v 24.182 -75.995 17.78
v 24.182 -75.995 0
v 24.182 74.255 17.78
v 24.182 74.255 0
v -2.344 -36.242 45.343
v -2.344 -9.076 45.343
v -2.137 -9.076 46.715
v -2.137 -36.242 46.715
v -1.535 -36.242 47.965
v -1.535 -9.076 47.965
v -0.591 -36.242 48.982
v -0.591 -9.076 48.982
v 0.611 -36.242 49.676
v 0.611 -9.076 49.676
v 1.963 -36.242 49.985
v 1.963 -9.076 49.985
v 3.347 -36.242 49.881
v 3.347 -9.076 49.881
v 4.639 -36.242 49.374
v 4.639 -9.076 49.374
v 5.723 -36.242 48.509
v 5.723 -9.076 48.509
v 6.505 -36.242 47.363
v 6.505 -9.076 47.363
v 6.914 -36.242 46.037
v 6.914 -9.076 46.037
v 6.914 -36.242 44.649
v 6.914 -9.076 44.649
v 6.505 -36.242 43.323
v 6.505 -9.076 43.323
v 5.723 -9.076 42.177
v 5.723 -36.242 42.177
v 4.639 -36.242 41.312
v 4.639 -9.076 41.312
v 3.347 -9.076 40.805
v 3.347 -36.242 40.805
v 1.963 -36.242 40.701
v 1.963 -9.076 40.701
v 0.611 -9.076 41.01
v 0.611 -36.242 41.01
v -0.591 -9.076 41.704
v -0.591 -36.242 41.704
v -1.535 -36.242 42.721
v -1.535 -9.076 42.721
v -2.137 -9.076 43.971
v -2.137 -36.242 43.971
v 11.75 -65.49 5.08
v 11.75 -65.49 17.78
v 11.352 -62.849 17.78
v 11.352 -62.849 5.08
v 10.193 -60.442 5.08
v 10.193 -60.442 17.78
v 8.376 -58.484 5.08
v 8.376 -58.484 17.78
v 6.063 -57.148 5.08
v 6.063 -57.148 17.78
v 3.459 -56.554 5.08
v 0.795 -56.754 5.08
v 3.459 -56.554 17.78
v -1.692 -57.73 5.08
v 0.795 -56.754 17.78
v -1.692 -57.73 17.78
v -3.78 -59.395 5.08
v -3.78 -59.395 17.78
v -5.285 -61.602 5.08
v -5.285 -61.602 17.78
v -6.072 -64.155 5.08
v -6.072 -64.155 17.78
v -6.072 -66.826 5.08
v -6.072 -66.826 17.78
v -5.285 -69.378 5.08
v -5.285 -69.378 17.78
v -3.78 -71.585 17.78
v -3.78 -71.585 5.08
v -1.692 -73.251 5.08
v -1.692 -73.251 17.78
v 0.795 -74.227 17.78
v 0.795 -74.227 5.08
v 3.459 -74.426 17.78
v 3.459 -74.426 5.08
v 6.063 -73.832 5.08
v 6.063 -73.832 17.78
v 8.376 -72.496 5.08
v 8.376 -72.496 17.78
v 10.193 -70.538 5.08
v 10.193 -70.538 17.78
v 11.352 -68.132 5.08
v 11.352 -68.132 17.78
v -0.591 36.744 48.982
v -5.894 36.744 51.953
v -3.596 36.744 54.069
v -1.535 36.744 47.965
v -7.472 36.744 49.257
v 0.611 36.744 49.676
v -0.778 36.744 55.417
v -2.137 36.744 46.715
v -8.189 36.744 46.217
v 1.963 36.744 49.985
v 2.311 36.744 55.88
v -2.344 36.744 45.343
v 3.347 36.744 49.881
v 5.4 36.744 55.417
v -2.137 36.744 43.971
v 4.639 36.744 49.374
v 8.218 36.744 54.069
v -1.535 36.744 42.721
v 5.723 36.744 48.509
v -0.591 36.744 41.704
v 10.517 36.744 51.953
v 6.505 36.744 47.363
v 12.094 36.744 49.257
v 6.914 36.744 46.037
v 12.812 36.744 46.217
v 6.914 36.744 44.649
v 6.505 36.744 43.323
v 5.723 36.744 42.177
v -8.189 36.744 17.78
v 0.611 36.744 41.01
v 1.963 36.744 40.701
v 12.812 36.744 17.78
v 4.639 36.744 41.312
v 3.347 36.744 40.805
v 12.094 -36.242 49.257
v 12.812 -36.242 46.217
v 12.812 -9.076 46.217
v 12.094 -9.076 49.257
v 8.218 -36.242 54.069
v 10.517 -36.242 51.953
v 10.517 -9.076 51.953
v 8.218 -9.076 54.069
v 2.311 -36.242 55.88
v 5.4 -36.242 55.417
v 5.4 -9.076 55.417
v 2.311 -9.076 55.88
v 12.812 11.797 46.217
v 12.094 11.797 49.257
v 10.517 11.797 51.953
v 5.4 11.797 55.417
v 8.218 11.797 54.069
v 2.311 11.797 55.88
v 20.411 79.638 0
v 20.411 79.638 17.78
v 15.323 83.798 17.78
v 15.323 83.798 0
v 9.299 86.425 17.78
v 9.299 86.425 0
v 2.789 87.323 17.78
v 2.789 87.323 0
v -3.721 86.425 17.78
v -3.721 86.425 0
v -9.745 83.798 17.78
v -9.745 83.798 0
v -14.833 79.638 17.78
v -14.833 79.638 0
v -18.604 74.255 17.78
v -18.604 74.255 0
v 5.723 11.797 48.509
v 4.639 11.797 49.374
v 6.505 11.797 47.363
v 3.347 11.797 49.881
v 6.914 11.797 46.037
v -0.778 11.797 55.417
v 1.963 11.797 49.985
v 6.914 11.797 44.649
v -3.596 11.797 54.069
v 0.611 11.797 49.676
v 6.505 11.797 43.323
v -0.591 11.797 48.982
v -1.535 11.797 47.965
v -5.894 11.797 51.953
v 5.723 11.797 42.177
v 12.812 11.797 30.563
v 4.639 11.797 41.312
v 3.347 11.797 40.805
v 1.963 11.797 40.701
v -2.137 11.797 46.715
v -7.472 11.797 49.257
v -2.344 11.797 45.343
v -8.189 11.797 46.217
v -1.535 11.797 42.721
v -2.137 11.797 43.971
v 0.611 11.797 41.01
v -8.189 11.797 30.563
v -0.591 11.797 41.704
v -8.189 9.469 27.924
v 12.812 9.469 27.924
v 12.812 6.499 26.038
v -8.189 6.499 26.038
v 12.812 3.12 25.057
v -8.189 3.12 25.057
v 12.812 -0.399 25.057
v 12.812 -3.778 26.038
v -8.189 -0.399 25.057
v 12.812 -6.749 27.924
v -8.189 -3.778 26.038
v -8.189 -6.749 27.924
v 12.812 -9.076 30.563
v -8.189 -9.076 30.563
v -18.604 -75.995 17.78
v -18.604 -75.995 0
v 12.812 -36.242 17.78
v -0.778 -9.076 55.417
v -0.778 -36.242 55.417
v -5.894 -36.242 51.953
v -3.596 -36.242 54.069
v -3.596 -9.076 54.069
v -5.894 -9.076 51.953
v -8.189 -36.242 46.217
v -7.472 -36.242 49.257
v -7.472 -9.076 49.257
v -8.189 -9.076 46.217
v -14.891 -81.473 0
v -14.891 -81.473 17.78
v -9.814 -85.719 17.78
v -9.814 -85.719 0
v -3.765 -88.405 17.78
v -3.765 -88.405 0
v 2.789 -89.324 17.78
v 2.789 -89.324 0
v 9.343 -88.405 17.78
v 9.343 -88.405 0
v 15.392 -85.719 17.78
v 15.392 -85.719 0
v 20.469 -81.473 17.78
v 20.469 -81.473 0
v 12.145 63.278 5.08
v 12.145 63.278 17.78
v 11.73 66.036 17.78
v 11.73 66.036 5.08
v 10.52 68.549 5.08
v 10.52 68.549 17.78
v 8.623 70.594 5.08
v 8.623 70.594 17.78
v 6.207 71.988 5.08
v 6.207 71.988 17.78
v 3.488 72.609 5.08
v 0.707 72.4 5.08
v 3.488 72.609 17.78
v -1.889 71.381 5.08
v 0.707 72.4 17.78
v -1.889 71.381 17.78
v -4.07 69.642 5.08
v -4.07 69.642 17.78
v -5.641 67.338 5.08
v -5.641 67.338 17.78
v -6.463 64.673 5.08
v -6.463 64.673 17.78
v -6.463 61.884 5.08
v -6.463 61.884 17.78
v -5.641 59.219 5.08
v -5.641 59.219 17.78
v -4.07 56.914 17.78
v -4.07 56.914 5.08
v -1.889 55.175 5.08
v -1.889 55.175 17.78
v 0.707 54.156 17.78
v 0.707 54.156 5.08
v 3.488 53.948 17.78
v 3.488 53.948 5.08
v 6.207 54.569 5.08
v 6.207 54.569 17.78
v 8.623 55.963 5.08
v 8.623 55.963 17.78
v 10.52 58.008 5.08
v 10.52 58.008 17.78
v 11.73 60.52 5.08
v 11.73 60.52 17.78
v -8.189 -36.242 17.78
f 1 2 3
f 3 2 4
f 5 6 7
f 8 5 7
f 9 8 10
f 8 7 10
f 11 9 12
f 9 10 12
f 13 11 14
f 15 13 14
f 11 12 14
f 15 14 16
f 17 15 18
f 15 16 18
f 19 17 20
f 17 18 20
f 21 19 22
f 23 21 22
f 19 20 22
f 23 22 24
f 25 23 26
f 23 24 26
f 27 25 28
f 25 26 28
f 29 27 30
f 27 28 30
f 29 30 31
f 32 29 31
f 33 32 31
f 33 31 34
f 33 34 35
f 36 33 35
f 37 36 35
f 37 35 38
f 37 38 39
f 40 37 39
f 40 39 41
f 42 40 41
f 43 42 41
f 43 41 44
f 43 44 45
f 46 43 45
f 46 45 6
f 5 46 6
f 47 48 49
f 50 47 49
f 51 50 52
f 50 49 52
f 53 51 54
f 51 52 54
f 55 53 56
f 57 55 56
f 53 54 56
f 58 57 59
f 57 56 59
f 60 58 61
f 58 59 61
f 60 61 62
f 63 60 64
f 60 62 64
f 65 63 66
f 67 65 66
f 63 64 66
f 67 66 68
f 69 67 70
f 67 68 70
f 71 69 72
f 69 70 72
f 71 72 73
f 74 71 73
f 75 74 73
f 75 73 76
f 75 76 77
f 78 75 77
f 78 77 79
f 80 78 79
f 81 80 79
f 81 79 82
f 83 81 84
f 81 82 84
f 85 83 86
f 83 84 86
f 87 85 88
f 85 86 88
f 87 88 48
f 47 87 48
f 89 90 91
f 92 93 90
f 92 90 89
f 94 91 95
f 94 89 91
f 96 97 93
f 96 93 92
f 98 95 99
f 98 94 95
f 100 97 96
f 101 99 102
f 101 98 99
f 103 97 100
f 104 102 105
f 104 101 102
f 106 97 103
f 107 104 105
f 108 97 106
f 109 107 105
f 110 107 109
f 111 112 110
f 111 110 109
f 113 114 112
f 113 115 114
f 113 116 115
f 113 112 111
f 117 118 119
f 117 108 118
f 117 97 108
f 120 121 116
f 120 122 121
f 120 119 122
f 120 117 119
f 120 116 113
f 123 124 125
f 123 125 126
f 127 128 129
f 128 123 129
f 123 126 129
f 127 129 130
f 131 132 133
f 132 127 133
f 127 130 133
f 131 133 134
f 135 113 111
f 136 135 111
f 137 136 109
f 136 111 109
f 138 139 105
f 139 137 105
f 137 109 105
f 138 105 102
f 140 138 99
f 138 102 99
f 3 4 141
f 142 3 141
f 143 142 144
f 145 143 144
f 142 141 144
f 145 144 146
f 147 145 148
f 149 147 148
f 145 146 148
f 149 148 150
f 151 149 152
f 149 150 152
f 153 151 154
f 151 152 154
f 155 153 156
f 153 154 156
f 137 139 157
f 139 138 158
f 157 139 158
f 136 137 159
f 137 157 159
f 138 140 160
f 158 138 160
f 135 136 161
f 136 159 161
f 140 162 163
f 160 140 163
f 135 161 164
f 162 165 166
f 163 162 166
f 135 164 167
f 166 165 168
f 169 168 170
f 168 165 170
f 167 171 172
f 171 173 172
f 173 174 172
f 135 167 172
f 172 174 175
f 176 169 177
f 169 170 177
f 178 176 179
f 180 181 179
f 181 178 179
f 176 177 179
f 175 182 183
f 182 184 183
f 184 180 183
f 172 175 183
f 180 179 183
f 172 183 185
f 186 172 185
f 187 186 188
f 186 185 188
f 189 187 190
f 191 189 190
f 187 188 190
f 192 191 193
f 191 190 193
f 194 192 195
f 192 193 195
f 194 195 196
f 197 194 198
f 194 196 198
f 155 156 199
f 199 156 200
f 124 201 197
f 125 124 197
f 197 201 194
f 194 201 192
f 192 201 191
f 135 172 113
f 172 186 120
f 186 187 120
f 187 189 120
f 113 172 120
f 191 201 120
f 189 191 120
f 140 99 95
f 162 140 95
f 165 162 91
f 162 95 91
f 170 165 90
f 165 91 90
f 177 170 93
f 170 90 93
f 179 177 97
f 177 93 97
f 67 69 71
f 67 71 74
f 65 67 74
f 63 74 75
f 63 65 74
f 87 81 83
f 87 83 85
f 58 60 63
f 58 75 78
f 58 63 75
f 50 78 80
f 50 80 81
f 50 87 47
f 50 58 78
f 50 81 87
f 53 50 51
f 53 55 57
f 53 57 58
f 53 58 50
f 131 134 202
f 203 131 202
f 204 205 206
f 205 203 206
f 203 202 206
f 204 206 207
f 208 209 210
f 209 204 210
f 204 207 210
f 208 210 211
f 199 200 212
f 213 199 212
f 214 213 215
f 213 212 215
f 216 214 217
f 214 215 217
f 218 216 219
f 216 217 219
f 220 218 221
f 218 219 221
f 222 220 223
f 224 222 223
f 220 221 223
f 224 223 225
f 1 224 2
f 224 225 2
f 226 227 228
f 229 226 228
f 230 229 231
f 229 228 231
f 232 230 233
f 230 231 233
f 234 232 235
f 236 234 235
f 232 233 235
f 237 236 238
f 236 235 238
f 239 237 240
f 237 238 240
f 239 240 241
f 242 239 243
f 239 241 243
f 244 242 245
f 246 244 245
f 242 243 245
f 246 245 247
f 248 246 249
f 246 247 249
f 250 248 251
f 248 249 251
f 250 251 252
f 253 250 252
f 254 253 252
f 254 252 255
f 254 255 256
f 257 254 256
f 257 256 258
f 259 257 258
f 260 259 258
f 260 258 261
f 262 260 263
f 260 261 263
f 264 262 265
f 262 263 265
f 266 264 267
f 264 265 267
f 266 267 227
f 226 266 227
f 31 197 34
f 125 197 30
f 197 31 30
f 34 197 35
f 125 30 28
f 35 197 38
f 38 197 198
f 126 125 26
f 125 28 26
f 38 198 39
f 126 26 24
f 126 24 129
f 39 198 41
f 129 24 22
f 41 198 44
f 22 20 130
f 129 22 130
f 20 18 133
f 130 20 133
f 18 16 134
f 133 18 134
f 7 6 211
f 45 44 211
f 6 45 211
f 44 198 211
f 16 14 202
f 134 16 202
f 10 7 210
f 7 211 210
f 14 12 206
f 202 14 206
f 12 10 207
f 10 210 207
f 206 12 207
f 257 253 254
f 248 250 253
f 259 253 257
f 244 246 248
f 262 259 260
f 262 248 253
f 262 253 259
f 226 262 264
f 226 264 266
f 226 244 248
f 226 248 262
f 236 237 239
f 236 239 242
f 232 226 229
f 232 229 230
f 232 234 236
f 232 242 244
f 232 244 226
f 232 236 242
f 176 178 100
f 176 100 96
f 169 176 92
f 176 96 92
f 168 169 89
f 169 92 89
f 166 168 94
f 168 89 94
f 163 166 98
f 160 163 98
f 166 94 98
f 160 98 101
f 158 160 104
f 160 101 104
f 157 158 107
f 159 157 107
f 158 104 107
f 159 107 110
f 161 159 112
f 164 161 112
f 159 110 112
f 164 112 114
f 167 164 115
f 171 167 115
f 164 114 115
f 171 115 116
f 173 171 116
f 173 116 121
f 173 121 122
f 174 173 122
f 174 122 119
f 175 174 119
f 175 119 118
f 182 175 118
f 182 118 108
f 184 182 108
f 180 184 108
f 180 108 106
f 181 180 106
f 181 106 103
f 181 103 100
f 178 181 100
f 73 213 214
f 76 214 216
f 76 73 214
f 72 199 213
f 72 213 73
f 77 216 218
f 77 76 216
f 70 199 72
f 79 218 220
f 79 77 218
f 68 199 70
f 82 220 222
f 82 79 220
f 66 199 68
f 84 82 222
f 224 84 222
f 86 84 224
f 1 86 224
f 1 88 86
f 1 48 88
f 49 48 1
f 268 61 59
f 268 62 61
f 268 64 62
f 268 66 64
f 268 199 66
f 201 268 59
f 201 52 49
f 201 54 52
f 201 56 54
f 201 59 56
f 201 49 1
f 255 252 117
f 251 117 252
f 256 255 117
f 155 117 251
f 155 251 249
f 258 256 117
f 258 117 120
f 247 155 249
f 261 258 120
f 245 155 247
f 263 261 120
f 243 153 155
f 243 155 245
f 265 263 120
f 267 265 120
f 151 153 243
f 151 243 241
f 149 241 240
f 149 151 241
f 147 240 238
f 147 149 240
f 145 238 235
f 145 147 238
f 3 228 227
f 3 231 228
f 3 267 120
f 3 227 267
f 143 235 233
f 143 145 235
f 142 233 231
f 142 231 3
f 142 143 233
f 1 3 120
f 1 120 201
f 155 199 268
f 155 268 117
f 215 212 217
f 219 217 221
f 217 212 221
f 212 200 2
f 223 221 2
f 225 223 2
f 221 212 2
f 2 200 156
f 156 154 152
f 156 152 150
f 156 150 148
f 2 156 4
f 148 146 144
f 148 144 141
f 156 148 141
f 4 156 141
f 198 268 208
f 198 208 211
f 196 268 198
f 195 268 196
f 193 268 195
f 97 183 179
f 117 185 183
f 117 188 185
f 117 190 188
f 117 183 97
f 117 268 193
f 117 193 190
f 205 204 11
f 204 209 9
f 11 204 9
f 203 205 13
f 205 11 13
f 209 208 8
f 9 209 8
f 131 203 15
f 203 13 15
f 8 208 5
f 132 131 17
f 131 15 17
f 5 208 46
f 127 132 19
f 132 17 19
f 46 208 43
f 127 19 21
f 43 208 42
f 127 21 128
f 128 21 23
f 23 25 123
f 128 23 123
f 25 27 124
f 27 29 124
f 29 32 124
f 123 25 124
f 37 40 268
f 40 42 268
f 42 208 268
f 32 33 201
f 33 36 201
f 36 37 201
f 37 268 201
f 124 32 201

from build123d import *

# Parameters (mm, degrees)
F1_DEPTH  = 17.78
F2_R      = 8.961227
F2_R_2    = 9.35653
F3_DEPTH  = 12.7
F4_W      = 21.001198
F4_H      = 72.985793
F5_DEPTH  = 38.1
F7_DEPTH  = 126.068455
F9_DEPTH  = 32.372704
F10_R     = 4.654821
F11_DEPTH = 126.068455


with BuildPart() as f1:
    # F0 (on Top) → F1 (new body)
    with BuildSketch(Plane.XY):
        with BuildLine():
            ThreePointArc((-18.604314, -75.995304), (2.788962, -89.323594), (24.182238, -75.995304))
            Line((24.182238, -75.995304), (24.182238, 74.255139))
            ThreePointArc((24.182238, 74.255139), (2.788962, 87.323361), (-18.604314, 74.255139))
            Line((-18.604314, 74.255139), (-18.604314, -75.995304))
        make_face()
    extrude(amount=F1_DEPTH)

    # F2 (on face) → F3 (cut)
    with BuildSketch(Plane.XY.offset(17.78)):
        with Locations((2.788962, -65.490246)):
            Circle(F2_R)
        with Locations((2.788962, 63.278366)):
            Circle(F2_R_2)
    extrude(amount=-F3_DEPTH, mode=Mode.SUBTRACT)

    # F4 (on face) → F5 (join)
    with BuildSketch(Plane.XY.offset(17.78)):
        with Locations((2.311133, 0.250964)):
            Rectangle(F4_W, F4_H)
    extrude(amount=F5_DEPTH)

    # F6 (on face) → F7 (cut, through all)
    with BuildSketch(Plane(origin=(0, 36.743861, 0), x_dir=(-1, 0, 0), z_dir=(0, 1, 0))):
        with BuildLine():
            Line((8.189466, 55.88), (-2.311133, 55.88))
            ThreePointArc((-2.311133, 55.88), (4.823938, 53.096615), (8.189466, 46.216957))
            Line((8.189466, 46.216957), (8.189466, 55.88))
        make_face()
        with BuildLine():
            Line((-12.811732, 55.88), (-12.811732, 46.216957))
            ThreePointArc((-12.811732, 46.216957), (-9.446204, 53.096615), (-2.311133, 55.88))
            Line((-2.311133, 55.88), (-12.811732, 55.88))
        make_face()
    extrude(amount=-F7_DEPTH, mode=Mode.SUBTRACT)

    # F8 (on face) → F9 (cut, through all)
    with BuildSketch(Plane(origin=(-8.189466, 0, 0), x_dir=(0, -1, 0), z_dir=(-1, 0, 0))):
        with BuildLine():
            Line((9.075661, 56.156088), (-11.796514, 56.156088))
            Line((-11.796514, 56.156088), (-11.796514, 30.562826))
            ThreePointArc((-11.796514, 30.562826), (-1.360426, 24.932368), (9.075661, 30.562826))
            Line((9.075661, 30.562826), (9.075661, 56.156088))
        make_face()
    extrude(amount=-F9_DEPTH, mode=Mode.SUBTRACT)

    # F10 (on face) → F11 (cut, through all)
    with BuildSketch(Plane(origin=(0, 36.743861, 0), x_dir=(-1, 0, 0), z_dir=(0, 1, 0))):
        with Locations((-2.311133, 45.343103)):
            Circle(F10_R)
    extrude(amount=-F11_DEPTH, mode=Mode.SUBTRACT)


solid = f1.part
